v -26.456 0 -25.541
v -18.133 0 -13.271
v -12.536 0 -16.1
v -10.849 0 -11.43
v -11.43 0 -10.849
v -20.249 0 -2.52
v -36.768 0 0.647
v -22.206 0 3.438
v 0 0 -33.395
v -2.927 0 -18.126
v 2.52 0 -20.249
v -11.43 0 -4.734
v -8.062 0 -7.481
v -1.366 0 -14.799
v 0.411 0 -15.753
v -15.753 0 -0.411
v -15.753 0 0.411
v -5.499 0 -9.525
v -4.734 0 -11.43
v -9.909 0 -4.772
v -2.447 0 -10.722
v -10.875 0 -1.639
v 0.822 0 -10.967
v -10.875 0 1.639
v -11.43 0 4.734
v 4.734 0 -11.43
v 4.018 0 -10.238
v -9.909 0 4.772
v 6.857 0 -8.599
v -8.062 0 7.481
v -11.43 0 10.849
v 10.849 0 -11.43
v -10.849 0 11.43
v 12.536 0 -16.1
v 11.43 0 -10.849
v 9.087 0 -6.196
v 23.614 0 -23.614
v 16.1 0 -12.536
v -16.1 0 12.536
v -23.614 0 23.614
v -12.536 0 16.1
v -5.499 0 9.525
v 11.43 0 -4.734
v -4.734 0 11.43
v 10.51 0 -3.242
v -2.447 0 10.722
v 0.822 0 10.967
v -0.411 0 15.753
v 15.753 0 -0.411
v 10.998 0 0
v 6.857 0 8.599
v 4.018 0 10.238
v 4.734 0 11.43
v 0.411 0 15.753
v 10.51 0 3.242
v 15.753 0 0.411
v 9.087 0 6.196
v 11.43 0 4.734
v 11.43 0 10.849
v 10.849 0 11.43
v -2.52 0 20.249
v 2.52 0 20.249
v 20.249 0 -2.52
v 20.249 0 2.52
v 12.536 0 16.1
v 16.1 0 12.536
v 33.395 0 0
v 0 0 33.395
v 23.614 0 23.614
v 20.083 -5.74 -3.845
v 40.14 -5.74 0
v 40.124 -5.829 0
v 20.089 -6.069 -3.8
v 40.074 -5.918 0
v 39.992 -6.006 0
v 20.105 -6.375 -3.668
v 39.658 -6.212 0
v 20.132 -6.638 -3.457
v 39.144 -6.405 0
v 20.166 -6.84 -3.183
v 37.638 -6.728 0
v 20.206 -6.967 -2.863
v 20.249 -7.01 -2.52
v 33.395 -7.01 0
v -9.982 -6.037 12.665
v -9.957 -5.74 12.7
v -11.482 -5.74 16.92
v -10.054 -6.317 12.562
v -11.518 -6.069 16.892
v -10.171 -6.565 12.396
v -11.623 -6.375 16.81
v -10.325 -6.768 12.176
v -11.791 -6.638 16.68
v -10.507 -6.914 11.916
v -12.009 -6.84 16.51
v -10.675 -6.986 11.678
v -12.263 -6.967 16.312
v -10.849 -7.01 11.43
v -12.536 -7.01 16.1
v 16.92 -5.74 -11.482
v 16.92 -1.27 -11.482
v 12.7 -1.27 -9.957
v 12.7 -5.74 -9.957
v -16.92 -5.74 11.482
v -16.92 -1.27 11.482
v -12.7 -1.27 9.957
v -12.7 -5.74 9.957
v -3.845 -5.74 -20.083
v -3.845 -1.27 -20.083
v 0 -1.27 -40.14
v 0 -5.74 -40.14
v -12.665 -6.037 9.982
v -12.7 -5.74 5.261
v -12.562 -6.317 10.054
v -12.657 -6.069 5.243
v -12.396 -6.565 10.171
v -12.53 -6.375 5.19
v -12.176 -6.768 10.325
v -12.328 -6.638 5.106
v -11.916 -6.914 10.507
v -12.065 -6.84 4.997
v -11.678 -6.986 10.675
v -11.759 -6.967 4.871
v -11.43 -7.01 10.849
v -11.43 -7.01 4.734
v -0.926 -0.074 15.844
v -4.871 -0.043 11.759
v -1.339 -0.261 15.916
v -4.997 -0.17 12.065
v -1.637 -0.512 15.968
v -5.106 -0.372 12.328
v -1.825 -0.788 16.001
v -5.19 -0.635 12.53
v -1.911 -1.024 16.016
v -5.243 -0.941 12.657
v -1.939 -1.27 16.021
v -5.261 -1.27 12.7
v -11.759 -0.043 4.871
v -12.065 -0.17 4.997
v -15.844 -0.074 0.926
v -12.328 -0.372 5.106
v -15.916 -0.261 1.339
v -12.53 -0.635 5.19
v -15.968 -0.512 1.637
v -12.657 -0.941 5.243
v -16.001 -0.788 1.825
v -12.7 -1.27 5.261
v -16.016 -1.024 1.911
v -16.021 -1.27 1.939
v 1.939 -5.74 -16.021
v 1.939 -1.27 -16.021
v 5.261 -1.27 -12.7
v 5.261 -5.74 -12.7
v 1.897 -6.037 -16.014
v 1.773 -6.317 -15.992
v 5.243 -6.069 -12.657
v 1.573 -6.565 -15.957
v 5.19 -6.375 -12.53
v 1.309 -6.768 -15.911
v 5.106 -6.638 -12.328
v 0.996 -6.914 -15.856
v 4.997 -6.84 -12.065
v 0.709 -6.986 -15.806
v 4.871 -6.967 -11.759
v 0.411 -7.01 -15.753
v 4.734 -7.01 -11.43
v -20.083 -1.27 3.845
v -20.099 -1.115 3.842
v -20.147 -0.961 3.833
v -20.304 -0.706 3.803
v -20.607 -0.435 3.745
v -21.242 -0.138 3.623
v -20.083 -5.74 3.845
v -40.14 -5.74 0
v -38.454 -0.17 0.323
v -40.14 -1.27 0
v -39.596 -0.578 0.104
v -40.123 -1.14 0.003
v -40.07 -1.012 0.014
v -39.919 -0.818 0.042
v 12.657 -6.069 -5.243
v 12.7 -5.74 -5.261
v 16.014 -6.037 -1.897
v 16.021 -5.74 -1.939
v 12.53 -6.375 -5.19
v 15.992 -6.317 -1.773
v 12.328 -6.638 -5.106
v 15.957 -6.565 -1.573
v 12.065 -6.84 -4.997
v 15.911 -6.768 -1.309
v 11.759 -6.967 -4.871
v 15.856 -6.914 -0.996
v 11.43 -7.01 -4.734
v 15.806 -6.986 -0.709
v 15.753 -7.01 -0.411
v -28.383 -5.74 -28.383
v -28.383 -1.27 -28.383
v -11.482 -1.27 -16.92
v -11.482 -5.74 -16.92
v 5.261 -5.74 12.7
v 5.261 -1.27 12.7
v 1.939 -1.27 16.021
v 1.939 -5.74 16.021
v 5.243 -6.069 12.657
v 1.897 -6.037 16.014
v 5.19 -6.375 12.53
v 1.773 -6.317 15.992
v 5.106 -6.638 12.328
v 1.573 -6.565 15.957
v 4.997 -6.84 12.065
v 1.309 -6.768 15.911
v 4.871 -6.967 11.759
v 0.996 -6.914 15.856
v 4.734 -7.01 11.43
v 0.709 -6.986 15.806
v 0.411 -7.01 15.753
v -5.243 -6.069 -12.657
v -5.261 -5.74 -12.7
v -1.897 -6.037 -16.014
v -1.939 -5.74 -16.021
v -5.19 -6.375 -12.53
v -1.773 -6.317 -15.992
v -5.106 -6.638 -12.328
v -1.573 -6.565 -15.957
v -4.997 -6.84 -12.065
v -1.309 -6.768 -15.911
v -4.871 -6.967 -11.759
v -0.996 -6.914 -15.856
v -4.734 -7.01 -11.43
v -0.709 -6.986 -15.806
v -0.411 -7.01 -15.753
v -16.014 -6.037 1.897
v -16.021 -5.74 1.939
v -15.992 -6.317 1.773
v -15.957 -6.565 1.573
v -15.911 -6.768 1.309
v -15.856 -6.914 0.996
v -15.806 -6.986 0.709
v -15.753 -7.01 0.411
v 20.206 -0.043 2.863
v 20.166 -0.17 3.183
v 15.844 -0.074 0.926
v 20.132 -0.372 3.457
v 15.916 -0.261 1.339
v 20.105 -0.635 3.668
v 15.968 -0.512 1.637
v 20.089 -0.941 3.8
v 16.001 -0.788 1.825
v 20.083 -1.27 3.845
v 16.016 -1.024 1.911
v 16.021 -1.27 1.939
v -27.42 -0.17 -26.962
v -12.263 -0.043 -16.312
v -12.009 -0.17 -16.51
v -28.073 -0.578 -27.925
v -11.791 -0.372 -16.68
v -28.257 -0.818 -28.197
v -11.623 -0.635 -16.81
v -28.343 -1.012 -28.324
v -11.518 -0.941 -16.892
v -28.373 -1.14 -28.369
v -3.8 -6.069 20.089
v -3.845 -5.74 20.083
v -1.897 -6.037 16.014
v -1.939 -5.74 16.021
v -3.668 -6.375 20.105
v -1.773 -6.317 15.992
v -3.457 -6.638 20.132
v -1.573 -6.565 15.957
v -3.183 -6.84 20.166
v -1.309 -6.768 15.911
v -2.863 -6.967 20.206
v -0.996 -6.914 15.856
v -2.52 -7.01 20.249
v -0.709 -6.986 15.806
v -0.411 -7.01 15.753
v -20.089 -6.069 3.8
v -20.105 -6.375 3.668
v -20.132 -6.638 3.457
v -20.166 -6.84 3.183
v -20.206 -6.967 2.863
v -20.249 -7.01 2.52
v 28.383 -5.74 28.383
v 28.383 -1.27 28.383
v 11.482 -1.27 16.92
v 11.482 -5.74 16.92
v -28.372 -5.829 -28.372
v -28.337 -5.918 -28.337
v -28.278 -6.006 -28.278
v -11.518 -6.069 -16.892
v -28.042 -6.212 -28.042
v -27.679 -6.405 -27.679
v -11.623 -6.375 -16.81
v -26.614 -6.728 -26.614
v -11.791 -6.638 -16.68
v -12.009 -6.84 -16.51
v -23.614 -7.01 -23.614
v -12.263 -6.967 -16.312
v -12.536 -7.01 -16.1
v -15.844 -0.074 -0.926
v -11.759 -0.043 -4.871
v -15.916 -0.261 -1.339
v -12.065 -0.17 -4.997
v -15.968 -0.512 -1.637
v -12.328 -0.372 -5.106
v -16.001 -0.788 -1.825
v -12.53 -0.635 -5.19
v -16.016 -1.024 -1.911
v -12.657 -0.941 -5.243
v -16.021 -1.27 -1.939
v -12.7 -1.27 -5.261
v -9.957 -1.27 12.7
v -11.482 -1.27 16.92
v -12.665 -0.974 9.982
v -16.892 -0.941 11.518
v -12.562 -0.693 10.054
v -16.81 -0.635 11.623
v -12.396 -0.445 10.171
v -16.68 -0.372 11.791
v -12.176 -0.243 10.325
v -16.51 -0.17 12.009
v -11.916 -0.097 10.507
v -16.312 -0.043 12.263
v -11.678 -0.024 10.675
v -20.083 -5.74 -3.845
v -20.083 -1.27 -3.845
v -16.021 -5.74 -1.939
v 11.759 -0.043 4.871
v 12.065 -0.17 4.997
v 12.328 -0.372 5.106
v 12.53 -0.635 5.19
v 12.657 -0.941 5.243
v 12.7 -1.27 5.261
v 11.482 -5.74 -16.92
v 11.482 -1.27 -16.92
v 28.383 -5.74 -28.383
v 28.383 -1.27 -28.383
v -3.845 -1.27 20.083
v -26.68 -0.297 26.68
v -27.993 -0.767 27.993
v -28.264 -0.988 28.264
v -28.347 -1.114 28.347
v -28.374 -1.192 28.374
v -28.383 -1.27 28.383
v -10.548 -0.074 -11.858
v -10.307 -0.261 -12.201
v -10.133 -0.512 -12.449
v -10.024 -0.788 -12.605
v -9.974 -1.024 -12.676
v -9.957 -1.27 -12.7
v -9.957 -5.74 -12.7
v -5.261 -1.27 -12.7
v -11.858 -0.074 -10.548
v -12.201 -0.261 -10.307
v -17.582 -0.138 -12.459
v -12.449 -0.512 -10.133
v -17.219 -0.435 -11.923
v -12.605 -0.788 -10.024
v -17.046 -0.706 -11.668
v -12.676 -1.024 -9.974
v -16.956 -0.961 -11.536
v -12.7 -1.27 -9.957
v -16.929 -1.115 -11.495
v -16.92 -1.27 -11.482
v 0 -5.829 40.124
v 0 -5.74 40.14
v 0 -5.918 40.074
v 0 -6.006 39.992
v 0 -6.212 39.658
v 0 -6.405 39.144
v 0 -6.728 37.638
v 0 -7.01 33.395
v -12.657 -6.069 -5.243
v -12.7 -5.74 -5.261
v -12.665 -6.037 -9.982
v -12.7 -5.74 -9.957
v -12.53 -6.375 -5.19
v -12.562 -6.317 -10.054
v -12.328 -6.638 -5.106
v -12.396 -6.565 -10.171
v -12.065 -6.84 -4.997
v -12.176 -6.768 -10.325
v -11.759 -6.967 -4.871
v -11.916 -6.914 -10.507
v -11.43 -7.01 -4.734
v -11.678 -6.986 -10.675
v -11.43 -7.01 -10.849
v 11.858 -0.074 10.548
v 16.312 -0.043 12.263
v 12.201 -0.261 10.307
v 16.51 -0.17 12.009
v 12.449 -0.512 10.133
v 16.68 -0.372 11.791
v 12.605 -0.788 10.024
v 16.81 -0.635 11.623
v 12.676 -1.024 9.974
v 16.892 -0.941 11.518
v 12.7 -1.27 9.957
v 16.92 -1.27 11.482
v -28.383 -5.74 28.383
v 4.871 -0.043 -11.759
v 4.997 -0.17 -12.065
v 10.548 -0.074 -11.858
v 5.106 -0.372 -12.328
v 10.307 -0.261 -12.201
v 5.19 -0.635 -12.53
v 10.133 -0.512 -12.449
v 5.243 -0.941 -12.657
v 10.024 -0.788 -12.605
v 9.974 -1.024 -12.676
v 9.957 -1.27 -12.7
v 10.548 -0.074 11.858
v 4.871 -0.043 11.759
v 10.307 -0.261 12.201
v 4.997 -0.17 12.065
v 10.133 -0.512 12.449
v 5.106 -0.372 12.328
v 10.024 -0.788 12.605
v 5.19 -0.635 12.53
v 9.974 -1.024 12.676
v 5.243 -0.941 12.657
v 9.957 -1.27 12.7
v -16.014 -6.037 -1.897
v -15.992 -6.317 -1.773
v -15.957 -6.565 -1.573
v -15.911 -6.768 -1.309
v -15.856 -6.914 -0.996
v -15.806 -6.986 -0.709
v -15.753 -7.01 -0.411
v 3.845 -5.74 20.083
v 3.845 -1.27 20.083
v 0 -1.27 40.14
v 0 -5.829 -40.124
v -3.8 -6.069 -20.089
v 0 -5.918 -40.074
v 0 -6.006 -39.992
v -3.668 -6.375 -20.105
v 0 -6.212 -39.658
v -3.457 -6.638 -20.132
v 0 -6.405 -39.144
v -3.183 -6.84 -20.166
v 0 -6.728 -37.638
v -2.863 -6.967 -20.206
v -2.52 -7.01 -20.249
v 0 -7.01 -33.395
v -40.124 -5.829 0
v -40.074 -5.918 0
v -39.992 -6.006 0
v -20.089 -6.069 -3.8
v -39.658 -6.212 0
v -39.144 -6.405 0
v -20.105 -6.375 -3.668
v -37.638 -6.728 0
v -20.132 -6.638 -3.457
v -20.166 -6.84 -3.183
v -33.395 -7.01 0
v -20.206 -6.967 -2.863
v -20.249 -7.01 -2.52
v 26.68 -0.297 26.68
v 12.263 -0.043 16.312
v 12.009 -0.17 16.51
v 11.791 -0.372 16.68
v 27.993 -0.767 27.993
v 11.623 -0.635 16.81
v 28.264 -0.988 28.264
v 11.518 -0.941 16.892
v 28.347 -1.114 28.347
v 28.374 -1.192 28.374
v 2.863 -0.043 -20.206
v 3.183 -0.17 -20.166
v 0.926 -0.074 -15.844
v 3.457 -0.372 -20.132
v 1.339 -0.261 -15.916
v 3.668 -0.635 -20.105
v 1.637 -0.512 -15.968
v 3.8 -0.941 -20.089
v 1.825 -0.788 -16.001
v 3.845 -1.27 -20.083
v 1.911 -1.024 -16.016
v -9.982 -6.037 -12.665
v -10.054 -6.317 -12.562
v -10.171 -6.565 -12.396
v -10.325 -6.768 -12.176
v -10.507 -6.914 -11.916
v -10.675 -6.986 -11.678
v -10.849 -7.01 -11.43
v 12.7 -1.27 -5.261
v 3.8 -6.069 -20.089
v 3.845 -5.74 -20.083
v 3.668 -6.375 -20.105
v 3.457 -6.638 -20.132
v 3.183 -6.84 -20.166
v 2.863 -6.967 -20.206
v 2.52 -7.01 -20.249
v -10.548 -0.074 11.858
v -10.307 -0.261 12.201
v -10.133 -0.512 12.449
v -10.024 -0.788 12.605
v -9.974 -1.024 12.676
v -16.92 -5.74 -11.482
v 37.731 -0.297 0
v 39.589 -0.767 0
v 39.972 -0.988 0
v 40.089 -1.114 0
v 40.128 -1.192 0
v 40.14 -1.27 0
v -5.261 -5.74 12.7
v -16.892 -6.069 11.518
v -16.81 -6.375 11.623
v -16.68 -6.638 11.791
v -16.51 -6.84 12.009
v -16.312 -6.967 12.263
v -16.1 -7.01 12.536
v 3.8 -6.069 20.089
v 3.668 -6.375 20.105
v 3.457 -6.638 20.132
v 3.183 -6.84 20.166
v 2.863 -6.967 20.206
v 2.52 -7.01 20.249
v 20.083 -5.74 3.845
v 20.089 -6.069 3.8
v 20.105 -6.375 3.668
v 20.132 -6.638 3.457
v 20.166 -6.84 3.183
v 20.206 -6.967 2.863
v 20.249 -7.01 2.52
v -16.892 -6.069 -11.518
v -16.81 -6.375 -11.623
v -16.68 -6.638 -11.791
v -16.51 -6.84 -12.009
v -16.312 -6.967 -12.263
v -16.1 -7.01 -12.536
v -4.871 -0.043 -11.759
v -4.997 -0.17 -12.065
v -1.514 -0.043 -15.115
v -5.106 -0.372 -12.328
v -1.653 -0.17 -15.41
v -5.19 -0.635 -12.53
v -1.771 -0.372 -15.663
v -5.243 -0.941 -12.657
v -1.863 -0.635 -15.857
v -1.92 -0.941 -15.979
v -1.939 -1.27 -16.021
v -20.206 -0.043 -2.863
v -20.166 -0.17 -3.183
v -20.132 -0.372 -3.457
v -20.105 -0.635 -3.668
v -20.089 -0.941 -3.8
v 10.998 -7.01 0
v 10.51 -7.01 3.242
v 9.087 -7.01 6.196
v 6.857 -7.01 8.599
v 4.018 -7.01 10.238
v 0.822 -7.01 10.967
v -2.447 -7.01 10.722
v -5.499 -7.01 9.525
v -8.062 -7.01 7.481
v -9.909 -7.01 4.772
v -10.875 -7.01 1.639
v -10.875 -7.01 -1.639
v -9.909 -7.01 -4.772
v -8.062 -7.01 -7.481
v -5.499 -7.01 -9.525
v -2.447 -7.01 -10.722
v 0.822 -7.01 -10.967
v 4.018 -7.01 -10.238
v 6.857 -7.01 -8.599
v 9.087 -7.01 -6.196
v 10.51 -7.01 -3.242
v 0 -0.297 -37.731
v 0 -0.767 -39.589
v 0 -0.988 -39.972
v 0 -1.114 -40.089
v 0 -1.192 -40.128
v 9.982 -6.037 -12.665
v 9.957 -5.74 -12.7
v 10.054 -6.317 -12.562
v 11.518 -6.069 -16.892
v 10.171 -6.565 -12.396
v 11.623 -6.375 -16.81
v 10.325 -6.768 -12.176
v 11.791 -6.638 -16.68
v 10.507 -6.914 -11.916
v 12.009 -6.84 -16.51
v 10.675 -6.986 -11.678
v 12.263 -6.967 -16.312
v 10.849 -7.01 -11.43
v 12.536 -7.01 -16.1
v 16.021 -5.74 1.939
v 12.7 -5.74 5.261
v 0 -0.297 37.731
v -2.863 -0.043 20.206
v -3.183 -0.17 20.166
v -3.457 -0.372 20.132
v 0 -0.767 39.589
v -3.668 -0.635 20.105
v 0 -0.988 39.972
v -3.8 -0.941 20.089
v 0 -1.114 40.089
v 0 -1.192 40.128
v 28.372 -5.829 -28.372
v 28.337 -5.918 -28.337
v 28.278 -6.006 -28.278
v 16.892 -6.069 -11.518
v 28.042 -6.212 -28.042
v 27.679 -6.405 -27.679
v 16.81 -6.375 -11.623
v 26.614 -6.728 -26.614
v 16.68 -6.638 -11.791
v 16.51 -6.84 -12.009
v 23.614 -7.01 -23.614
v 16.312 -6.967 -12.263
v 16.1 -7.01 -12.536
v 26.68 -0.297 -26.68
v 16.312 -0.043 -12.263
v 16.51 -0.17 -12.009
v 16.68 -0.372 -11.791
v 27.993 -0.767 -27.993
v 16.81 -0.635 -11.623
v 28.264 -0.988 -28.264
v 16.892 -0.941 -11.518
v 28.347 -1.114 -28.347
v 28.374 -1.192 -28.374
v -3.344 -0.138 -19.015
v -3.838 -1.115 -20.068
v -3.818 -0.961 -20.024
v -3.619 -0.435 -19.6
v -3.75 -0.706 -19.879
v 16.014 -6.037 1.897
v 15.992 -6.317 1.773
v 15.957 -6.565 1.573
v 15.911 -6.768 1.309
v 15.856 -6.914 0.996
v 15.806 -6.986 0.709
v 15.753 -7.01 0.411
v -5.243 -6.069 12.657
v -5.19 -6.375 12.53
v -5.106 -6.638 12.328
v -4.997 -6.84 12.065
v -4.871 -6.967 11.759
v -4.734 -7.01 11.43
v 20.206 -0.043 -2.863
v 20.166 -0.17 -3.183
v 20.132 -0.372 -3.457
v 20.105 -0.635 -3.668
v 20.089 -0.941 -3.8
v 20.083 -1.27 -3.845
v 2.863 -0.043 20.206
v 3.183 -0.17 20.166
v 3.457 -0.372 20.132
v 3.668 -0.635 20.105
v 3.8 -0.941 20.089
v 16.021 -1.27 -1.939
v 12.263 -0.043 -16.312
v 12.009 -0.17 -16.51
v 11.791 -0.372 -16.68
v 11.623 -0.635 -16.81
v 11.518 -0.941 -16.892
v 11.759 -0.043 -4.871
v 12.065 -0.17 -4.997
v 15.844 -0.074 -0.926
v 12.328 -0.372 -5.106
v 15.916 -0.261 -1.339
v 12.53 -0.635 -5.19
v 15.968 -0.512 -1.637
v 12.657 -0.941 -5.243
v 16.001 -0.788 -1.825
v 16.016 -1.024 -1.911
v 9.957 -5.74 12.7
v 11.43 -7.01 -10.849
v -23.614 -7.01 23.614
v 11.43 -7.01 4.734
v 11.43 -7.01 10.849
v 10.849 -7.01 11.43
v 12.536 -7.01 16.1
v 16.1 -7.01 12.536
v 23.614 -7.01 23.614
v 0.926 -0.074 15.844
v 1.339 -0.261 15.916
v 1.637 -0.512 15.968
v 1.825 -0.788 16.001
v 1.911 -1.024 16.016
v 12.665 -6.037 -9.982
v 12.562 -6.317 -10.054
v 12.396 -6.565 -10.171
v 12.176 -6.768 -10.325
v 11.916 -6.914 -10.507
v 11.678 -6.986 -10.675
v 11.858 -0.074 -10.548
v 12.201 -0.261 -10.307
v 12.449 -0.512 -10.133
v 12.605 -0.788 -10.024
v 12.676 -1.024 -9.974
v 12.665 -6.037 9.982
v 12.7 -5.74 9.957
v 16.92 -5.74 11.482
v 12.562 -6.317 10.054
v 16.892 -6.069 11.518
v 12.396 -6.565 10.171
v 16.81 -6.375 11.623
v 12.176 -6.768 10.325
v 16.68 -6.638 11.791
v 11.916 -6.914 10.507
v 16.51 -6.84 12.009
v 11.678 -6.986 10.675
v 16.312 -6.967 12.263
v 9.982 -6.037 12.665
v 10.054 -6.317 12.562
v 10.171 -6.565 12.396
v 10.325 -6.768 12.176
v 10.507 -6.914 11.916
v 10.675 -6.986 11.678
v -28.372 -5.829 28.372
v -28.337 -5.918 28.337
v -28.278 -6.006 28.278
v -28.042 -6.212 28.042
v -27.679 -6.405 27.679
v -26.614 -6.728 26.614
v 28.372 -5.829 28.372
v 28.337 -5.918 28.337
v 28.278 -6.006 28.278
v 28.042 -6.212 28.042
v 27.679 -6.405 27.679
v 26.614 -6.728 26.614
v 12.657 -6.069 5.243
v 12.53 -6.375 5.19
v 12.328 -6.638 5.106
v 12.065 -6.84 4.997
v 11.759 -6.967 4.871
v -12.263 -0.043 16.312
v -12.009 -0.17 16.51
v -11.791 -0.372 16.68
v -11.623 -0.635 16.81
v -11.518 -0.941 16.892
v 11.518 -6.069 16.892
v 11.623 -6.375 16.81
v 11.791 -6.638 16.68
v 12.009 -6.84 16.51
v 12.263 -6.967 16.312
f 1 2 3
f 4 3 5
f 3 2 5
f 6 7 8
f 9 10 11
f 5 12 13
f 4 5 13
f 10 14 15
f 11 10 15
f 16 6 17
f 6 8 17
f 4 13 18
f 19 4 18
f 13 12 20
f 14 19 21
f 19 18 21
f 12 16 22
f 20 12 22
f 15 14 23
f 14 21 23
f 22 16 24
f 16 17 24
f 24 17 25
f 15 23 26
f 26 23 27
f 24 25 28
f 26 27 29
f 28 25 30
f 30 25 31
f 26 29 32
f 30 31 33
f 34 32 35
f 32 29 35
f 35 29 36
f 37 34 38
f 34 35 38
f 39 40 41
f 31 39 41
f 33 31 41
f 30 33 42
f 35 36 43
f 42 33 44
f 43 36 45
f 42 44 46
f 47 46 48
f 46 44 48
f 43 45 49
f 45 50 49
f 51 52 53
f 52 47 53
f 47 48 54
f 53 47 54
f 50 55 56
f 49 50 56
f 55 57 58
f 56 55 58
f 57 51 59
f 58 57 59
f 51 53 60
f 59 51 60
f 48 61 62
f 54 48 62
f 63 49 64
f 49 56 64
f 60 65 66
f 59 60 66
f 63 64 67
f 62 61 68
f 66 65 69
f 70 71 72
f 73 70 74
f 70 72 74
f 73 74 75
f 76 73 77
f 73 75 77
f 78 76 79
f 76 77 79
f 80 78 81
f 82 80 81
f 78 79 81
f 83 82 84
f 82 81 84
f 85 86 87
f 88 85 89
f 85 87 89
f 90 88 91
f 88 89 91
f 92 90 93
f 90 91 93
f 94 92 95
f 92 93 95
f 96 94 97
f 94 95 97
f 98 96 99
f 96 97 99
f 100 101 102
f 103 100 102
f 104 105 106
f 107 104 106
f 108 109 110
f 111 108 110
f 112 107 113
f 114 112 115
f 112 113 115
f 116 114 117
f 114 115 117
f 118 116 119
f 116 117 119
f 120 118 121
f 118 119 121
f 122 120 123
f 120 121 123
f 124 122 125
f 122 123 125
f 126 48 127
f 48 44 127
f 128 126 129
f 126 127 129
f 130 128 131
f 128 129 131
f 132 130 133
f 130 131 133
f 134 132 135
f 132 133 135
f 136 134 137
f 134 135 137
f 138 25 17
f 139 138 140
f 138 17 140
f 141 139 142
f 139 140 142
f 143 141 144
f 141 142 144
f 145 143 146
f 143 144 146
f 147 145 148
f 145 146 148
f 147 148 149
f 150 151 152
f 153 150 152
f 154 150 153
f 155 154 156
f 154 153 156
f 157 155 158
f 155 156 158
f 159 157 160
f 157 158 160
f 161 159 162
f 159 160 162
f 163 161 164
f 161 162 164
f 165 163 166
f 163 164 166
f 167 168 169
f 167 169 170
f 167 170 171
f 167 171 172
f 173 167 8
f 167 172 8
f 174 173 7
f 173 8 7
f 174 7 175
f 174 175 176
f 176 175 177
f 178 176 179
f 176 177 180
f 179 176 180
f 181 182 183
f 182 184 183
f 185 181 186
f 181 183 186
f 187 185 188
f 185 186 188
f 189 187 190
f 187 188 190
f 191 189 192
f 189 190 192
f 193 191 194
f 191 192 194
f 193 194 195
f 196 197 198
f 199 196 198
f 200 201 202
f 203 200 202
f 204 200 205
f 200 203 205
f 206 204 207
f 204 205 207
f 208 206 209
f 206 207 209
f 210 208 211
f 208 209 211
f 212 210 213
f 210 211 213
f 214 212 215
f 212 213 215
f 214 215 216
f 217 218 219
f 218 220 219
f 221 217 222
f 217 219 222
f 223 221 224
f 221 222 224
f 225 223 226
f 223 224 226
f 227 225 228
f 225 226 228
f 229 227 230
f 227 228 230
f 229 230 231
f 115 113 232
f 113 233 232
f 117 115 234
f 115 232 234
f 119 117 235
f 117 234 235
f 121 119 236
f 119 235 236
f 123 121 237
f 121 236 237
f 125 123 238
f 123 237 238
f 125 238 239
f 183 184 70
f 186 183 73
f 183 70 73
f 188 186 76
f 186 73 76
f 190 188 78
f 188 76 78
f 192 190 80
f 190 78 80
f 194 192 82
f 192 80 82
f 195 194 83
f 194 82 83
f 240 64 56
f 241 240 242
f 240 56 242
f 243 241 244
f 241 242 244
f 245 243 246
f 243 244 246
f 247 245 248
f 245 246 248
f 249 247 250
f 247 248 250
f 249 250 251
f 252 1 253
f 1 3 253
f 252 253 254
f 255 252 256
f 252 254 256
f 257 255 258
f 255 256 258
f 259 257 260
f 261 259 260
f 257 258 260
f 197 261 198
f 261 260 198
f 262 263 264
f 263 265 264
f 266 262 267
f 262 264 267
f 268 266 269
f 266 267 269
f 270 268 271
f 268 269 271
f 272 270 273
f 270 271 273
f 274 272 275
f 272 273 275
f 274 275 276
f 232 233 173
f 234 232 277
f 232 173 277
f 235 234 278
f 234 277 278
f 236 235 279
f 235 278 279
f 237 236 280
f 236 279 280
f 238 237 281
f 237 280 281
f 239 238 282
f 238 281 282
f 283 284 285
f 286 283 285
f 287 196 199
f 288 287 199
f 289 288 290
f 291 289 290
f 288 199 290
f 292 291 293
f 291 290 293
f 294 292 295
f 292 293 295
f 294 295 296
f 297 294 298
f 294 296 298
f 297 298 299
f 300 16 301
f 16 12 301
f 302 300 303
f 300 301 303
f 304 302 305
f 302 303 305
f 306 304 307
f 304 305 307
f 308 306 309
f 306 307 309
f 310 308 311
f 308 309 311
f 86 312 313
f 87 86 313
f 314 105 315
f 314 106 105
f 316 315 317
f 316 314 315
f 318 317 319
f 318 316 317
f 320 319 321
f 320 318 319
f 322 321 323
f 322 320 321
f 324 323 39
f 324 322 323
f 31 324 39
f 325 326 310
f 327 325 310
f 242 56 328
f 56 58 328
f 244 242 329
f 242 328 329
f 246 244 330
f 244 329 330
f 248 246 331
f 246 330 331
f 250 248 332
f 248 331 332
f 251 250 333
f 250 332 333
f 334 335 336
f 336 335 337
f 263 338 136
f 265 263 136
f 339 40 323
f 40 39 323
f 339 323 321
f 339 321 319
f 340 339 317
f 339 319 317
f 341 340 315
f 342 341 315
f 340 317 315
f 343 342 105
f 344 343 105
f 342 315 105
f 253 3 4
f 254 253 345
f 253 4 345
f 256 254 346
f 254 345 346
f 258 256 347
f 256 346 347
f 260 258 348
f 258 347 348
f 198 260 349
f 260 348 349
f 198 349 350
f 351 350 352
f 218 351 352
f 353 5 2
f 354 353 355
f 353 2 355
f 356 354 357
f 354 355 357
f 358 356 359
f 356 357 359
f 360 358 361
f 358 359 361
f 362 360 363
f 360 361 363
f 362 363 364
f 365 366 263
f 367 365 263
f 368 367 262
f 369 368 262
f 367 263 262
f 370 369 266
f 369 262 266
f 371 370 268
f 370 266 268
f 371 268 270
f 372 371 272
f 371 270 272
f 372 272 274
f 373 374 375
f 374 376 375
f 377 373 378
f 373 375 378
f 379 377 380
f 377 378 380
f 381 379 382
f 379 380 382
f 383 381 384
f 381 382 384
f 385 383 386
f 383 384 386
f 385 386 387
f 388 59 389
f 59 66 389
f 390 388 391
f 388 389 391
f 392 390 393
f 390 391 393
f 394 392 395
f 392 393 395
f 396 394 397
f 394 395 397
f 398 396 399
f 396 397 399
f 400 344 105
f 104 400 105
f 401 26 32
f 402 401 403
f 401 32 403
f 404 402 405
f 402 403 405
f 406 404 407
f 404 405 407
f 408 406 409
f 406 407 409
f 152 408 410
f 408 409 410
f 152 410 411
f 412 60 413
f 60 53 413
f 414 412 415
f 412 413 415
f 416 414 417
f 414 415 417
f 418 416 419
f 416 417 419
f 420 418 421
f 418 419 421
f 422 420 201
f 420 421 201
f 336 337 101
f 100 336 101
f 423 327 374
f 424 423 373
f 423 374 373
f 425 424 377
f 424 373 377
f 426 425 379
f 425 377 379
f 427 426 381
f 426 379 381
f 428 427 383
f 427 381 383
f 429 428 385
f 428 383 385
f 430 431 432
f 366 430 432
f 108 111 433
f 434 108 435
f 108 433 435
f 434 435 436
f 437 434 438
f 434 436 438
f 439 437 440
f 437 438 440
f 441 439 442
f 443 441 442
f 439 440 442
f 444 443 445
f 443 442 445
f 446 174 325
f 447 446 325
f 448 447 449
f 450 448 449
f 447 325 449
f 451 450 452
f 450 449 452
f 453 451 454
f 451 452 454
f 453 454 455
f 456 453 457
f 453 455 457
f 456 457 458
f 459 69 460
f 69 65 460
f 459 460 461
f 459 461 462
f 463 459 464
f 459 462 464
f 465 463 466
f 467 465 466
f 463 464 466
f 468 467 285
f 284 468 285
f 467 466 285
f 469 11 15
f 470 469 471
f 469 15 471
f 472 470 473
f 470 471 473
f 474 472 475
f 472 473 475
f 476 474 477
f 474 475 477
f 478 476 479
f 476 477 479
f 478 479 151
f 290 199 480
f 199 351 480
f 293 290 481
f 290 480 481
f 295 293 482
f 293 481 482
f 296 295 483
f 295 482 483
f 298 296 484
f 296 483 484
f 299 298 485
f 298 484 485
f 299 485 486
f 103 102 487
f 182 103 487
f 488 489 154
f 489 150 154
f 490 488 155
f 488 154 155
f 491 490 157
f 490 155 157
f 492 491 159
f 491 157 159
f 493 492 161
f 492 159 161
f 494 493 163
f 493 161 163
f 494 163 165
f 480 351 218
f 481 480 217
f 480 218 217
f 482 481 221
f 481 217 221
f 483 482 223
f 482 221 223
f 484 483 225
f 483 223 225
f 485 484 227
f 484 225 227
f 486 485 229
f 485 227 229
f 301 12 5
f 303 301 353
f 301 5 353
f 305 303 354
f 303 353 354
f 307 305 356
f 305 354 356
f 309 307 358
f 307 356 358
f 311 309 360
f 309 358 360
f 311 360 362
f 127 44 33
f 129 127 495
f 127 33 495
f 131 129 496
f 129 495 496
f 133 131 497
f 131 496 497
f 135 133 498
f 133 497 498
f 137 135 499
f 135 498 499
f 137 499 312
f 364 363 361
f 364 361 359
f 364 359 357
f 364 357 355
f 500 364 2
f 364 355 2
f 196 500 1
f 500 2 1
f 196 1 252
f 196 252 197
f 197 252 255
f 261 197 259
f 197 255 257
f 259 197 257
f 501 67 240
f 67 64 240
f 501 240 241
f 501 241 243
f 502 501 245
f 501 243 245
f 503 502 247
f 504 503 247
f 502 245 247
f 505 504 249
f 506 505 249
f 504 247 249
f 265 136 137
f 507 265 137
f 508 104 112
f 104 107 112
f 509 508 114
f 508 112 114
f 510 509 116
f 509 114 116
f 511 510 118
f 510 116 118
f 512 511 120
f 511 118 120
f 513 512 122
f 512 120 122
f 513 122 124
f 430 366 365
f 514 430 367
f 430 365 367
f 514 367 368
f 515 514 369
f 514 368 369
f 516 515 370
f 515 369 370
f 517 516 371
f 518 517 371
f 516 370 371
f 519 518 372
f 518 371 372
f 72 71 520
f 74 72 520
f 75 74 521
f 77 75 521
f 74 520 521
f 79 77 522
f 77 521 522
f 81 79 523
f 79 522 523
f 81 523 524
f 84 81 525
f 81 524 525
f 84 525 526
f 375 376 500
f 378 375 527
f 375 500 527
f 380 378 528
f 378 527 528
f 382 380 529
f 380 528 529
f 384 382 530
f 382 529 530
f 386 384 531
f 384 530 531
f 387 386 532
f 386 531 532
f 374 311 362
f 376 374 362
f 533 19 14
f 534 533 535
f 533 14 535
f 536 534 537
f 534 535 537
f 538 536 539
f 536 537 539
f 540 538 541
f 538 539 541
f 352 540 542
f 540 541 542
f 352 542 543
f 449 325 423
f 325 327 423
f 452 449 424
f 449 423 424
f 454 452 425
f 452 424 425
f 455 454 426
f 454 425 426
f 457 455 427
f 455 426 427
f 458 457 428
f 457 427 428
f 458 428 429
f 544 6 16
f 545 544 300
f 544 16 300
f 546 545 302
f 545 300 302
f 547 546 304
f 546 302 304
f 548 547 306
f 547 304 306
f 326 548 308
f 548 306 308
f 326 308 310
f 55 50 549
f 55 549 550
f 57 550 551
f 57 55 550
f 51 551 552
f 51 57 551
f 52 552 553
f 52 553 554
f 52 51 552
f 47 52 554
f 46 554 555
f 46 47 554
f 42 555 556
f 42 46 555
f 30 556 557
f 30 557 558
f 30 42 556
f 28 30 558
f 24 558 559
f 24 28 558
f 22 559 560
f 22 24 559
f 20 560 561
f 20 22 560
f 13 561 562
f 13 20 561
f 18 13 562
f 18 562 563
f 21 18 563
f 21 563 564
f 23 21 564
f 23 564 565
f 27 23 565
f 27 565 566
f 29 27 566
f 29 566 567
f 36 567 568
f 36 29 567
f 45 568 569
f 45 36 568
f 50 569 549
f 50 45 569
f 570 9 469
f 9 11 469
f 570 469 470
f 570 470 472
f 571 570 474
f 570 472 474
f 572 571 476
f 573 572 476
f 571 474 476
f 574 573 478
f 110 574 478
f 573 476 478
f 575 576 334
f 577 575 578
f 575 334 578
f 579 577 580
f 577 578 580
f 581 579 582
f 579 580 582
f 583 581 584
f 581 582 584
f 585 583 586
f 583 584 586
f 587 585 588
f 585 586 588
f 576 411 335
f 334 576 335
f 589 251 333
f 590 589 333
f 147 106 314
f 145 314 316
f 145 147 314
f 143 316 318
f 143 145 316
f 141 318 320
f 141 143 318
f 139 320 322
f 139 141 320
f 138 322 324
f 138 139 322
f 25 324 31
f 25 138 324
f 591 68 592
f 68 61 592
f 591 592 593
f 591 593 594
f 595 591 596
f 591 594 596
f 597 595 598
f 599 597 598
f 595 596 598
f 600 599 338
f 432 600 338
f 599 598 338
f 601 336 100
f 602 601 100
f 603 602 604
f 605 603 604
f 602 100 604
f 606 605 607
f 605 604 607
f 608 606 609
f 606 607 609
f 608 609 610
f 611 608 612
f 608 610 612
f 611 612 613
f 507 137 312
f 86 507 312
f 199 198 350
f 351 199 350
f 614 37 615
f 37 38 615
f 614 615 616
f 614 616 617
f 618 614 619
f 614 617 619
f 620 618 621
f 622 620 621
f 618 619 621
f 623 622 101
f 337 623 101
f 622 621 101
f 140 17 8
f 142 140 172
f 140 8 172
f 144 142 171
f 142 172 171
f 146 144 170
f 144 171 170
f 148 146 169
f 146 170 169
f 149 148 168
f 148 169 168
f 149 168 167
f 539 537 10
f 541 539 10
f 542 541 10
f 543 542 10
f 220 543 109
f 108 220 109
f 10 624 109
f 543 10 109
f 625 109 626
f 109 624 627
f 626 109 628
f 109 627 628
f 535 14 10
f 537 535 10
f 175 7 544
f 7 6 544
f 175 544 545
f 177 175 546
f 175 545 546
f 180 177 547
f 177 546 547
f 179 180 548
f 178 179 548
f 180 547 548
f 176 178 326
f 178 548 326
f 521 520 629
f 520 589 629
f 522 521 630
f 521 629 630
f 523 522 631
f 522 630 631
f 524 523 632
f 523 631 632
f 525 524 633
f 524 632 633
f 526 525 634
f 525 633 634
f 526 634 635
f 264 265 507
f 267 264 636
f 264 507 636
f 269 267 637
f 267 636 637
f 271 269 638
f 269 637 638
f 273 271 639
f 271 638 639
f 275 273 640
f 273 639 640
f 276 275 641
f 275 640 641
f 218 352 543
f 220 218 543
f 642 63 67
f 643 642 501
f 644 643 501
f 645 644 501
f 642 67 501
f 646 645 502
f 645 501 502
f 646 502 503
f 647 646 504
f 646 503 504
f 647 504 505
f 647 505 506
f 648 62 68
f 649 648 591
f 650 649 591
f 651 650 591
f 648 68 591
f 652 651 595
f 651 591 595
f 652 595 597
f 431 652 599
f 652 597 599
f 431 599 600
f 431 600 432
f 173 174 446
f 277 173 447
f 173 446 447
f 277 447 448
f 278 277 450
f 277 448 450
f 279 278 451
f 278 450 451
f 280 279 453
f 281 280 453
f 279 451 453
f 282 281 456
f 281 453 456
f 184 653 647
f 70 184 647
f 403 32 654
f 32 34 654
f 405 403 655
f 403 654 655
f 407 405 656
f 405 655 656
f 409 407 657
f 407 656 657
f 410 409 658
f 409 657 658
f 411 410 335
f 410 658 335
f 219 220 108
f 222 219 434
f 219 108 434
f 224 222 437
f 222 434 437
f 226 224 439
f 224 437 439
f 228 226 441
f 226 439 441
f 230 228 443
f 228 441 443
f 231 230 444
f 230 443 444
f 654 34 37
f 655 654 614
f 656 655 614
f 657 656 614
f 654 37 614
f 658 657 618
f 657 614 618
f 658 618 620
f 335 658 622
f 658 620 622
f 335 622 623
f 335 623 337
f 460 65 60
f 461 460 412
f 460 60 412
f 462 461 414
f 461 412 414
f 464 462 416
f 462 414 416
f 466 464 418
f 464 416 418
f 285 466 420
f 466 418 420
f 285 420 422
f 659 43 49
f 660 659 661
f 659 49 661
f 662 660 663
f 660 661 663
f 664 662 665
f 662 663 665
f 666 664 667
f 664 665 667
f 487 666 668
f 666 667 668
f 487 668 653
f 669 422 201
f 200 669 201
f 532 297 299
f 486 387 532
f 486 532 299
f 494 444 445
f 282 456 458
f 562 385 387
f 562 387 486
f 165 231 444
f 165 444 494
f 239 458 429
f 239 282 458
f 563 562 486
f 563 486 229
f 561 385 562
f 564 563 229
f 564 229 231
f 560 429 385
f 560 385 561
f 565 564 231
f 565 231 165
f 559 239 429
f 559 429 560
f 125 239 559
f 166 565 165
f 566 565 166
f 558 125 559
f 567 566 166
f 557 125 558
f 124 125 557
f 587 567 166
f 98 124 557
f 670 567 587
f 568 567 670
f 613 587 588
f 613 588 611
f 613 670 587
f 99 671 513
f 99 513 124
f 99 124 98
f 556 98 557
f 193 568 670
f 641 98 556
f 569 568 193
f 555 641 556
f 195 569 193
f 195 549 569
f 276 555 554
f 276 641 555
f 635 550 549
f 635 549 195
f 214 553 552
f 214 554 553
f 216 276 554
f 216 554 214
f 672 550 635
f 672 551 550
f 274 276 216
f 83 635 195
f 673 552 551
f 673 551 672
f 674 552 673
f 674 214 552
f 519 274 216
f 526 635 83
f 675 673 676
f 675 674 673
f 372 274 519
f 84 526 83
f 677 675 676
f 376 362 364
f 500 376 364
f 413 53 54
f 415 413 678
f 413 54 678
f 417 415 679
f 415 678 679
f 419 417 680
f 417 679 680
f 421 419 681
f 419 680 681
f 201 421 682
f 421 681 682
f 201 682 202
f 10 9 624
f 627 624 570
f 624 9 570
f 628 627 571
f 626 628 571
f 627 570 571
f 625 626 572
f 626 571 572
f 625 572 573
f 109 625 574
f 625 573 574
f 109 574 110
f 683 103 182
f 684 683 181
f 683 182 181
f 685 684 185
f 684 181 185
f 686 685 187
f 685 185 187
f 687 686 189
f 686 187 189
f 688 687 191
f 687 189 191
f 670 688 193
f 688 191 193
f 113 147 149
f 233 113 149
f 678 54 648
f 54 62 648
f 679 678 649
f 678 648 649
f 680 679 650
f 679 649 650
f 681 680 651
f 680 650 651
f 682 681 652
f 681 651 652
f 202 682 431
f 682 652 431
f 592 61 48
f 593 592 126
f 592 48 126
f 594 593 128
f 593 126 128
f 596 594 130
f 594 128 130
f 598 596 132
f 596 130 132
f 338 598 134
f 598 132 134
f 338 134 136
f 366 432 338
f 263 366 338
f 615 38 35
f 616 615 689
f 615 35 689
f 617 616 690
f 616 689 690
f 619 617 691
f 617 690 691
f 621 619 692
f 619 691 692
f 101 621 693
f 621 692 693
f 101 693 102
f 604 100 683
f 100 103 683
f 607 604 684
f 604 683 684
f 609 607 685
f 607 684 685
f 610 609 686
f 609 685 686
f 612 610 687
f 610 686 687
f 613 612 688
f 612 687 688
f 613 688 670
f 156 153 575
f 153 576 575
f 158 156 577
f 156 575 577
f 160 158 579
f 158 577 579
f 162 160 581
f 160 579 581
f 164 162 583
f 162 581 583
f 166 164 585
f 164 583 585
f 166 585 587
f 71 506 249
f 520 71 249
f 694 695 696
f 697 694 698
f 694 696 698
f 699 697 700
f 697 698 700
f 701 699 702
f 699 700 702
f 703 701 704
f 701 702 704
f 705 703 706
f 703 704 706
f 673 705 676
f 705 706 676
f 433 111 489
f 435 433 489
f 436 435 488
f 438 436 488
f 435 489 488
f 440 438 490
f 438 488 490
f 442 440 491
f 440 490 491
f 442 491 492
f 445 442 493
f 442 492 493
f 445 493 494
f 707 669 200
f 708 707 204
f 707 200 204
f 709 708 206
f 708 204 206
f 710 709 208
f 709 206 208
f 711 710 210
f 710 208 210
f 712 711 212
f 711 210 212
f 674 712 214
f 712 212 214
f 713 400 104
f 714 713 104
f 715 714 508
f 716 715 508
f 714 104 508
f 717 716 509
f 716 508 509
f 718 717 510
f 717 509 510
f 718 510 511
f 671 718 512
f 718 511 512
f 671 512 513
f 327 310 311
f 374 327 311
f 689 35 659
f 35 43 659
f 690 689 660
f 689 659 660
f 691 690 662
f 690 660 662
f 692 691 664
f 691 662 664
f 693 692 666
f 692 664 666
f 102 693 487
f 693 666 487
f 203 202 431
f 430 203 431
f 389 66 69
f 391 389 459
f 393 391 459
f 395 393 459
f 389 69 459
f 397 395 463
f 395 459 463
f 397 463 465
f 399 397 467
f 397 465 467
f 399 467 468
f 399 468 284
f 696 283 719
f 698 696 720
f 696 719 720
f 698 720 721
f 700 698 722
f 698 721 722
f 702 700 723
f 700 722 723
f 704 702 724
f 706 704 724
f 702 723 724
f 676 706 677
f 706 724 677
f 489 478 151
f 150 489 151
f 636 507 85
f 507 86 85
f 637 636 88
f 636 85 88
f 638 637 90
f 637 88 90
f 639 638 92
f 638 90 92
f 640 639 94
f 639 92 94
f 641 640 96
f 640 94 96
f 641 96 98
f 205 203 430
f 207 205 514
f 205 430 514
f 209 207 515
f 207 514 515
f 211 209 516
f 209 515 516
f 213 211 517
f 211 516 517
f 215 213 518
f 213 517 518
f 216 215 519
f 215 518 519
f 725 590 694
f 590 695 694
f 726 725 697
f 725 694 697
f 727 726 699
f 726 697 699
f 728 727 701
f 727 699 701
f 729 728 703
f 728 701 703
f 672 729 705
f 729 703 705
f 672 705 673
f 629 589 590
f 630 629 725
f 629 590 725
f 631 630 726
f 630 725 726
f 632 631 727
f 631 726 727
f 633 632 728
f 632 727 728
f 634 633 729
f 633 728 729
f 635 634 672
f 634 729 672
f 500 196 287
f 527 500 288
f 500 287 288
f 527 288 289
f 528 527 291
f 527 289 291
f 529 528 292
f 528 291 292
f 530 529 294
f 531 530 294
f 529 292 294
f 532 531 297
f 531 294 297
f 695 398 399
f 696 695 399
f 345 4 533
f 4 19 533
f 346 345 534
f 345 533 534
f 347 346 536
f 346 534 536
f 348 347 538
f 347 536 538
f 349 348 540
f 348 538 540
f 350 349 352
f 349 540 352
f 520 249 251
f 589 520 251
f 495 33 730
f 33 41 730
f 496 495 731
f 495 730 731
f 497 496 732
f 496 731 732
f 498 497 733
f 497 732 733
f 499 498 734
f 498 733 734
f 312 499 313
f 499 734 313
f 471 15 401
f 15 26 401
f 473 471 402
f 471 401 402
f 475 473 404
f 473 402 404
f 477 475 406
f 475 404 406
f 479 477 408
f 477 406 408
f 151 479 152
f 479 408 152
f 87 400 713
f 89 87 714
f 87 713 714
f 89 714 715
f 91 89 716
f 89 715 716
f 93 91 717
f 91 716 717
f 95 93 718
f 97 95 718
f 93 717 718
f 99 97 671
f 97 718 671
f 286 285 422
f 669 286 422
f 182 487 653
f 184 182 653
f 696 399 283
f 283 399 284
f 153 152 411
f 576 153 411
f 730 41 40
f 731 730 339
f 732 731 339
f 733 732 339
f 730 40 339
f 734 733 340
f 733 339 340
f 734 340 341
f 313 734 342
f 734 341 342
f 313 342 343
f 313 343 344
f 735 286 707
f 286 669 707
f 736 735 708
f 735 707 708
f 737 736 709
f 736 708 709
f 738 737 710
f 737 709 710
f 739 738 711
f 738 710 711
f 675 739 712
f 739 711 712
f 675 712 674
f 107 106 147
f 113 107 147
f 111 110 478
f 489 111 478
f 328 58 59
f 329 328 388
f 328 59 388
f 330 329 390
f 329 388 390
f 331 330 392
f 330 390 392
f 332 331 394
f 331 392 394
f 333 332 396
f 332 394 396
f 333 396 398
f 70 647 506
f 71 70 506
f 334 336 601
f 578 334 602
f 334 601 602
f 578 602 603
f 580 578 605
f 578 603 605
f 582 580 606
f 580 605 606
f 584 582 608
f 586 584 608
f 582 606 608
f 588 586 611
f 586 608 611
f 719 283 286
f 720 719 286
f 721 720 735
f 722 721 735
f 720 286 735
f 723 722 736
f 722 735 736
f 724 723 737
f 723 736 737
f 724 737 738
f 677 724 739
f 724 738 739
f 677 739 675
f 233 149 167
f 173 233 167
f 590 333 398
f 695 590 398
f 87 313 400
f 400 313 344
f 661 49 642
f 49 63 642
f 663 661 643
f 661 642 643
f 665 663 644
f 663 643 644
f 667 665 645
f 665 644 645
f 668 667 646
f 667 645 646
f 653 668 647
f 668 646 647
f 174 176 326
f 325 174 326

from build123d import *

# Parameters (mm, degrees)
F0_R     = 10.9982
F1_DEPTH = 7.0104
F2_R     = 1.27
F3_R     = 1.27


with BuildPart() as f1:
    # F0 (on Front) → F1 (new body)
    with BuildSketch(Plane.XZ):
        Polygon((-12.7, 9.9571658781), (-12.7, 5.2605122421), (-5.2605122421, 12.7), (-9.9571658781, 12.7), (-11.4818856978, 16.9197350247), (-28.3834853749, 28.3834853749), (-16.9197350247, 11.4818856978), align=None)
        Polygon((-16.0210356348, -1.9394766073), (-12.7, -5.2605122421), (-12.7, 5.2605122421), (-16.0210356348, 1.9394766073), (-20.0829786096, 3.8451401341), (-40.1403099645, 0), (-20.0829786096, -3.8451401341), align=None)
        Polygon((-9.9571658781, -12.7), (-5.2605122421, -12.7), (-12.7, -5.2605122421), (-12.7, -9.9571658781), (-16.9197350247, -11.4818856978), (-28.3834853749, -28.3834853749), (-11.4818856978, -16.9197350247), align=None)
        Polygon((1.9394766073, -16.0210356348), (5.2605122421, -12.7), (-5.2605122421, -12.7), (-1.9394766073, -16.0210356348), (-3.8451401341, -20.0829786096), (0, -40.1403099645), (3.8451401341, -20.0829786096), align=None)
        Polygon((12.7, -5.2605122421), (5.2605122421, -12.7), (9.9571658781, -12.7), (11.4818856978, -16.9197350247), (28.3834853749, -28.3834853749), (16.9197350247, -11.4818856978), (12.7, -9.9571658781), align=None)
        Polygon((12.7, 5.2605122421), (12.7, -5.2605122421), (16.0210356348, -1.9394766073), (20.0829786096, -3.8451401341), (40.1403099645, 0), (20.0829786096, 3.8451401341), (16.0210356348, 1.9394766073), align=None)
        Polygon((5.2605122421, 12.7), (12.7, 5.2605122421), (12.7, 9.9571658781), (16.9197350247, 11.4818856978), (28.3834853749, 28.3834853749), (11.4818856978, 16.9197350247), (9.9571658781, 12.7), align=None)
        Polygon((-5.2605122421, 12.7), (5.2605122421, 12.7), (1.9394766073, 16.0210356348), (3.8451401341, 20.0829786096), (0, 40.1403099645), (-3.8451401341, 20.0829786096), (-1.9394766073, 16.0210356348), align=None)
        Polygon((-5.2605122421, -12.7), (5.2605122421, -12.7), (12.7, -5.2605122421), (12.7, 5.2605122421), (5.2605122421, 12.7), (-5.2605122421, 12.7), (-12.7, 5.2605122421), (-12.7, -5.2605122421), align=None)
        Circle(F0_R, mode=Mode.SUBTRACT)
    extrude(amount=F1_DEPTH)

    # F2
    f2_edges = [f1.edges().sort_by_distance(p)[0] for p in [
        (-1.92257, -7.0104, -30.111644),
        (1.92257, -7.0104, -30.111644),
        (2.892308, -7.0104, -18.052007),
        (3.599994, -7.0104, -14.360518),
        (7.608839, -7.0104, -12.7),
        (10.719526, -7.0104, -14.809868),
        (19.932686, -7.0104, -22.65161),
        (22.65161, -7.0104, -19.932686),
        (14.809868, -7.0104, -10.719526),
        (12.7, -7.0104, -7.608839),
        (14.360518, -7.0104, -3.599994),
        (18.052007, -7.0104, -2.892308),
        (30.111644, -7.0104, -1.92257),
        (30.111644, -7.0104, 1.92257),
        (18.052007, -7.0104, 2.892308),
        (14.360518, -7.0104, 3.599994),
        (12.7, -7.0104, 7.608839),
        (14.809868, -7.0104, 10.719526),
        (22.65161, -7.0104, 19.932686),
        (19.932686, -7.0104, 22.65161),
        (10.719526, -7.0104, 14.809868),
        (7.608839, -7.0104, 12.7),
        (3.599994, -7.0104, 14.360518),
        (2.892308, -7.0104, 18.052007),
        (1.92257, -7.0104, 30.111644),
        (-1.92257, -7.0104, 30.111644),
        (-2.892308, -7.0104, 18.052007),
        (-3.599994, -7.0104, 14.360518),
        (-7.608839, -7.0104, 12.7),
        (-10.719526, -7.0104, 14.809868),
        (-19.932686, -7.0104, 22.65161),
        (-22.65161, -7.0104, 19.932686),
        (-14.809868, -7.0104, 10.719526),
        (-12.7, -7.0104, 7.608839),
        (-14.360518, -7.0104, 3.599994),
        (-18.052007, -7.0104, 2.892308),
        (-30.111644, -7.0104, 1.92257),
        (-19.932686, -7.0104, -22.65161),
        (-10.719526, -7.0104, -14.809868),
        (-7.608839, -7.0104, -12.7),
        (-3.599994, -7.0104, -14.360518),
        (-22.65161, -7.0104, -19.932686),
        (-14.809868, -7.0104, -10.719526),
        (-12.7, -7.0104, -7.608839),
        (-14.360518, -7.0104, -3.599994),
        (-18.052007, -7.0104, -2.892308),
        (-30.111644, -7.0104, -1.92257),
        (-2.892308, -7.0104, -18.052007),
    ]]
    fillet(f2_edges, radius=F2_R)

    # F3
    f3_edges = [f1.edges().sort_by_distance(p)[0] for p in [
        (19.932686, 0, 22.65161),
        (22.65161, 0, 19.932686),
        (14.809868, 0, 10.719526),
        (10.719526, 0, 14.809868),
        (7.608839, 0, 12.7),
        (3.599994, 0, 14.360518),
        (2.892308, 0, 18.052007),
        (1.92257, 0, 30.111644),
        (-1.92257, 0, 30.111644),
        (-2.892308, 0, 18.052007),
        (-3.599994, 0, 14.360518),
        (-7.608839, 0, 12.7),
        (-10.719526, 0, 14.809868),
        (-19.932686, 0, 22.65161),
        (-22.65161, 0, 19.932686),
        (-14.809868, 0, 10.719526),
        (-12.7, 0, 7.608839),
        (-14.360518, 0, 3.599994),
        (-18.052007, 0, 2.892308),
        (-30.111644, -5.7404, 1.92257),
        (-30.111644, 0, -1.92257),
        (-18.052007, 0, -2.892308),
        (-14.360518, 0, -3.599994),
        (-12.7, 0, -7.608839),
        (-14.809868, 0, -10.719526),
        (-22.65161, -5.7404, -19.932686),
        (-19.932686, 0, -22.65161),
        (-10.719526, 0, -14.809868),
        (-7.608839, 0, -12.7),
        (-3.599994, 0, -14.360518),
        (-2.892308, -5.7404, -18.052007),
        (-1.92257, 0, -30.111644),
        (1.92257, 0, -30.111644),
        (2.892308, 0, -18.052007),
        (3.599994, 0, -14.360518),
        (7.608839, 0, -12.7),
        (10.719526, 0, -14.809868),
        (19.932686, 0, -22.65161),
        (22.65161, 0, -19.932686),
        (14.809868, 0, -10.719526),
        (12.7, 0, -7.608839),
        (14.360518, 0, -3.599994),
        (18.052007, 0, -2.892308),
        (30.111644, 0, -1.92257),
        (30.111644, 0, 1.92257),
        (18.052007, 0, 2.892308),
        (14.360518, 0, 3.599994),
        (12.7, 0, 7.608839),
    ]]
    fillet(f3_edges, radius=F3_R)


solid = f1.part
